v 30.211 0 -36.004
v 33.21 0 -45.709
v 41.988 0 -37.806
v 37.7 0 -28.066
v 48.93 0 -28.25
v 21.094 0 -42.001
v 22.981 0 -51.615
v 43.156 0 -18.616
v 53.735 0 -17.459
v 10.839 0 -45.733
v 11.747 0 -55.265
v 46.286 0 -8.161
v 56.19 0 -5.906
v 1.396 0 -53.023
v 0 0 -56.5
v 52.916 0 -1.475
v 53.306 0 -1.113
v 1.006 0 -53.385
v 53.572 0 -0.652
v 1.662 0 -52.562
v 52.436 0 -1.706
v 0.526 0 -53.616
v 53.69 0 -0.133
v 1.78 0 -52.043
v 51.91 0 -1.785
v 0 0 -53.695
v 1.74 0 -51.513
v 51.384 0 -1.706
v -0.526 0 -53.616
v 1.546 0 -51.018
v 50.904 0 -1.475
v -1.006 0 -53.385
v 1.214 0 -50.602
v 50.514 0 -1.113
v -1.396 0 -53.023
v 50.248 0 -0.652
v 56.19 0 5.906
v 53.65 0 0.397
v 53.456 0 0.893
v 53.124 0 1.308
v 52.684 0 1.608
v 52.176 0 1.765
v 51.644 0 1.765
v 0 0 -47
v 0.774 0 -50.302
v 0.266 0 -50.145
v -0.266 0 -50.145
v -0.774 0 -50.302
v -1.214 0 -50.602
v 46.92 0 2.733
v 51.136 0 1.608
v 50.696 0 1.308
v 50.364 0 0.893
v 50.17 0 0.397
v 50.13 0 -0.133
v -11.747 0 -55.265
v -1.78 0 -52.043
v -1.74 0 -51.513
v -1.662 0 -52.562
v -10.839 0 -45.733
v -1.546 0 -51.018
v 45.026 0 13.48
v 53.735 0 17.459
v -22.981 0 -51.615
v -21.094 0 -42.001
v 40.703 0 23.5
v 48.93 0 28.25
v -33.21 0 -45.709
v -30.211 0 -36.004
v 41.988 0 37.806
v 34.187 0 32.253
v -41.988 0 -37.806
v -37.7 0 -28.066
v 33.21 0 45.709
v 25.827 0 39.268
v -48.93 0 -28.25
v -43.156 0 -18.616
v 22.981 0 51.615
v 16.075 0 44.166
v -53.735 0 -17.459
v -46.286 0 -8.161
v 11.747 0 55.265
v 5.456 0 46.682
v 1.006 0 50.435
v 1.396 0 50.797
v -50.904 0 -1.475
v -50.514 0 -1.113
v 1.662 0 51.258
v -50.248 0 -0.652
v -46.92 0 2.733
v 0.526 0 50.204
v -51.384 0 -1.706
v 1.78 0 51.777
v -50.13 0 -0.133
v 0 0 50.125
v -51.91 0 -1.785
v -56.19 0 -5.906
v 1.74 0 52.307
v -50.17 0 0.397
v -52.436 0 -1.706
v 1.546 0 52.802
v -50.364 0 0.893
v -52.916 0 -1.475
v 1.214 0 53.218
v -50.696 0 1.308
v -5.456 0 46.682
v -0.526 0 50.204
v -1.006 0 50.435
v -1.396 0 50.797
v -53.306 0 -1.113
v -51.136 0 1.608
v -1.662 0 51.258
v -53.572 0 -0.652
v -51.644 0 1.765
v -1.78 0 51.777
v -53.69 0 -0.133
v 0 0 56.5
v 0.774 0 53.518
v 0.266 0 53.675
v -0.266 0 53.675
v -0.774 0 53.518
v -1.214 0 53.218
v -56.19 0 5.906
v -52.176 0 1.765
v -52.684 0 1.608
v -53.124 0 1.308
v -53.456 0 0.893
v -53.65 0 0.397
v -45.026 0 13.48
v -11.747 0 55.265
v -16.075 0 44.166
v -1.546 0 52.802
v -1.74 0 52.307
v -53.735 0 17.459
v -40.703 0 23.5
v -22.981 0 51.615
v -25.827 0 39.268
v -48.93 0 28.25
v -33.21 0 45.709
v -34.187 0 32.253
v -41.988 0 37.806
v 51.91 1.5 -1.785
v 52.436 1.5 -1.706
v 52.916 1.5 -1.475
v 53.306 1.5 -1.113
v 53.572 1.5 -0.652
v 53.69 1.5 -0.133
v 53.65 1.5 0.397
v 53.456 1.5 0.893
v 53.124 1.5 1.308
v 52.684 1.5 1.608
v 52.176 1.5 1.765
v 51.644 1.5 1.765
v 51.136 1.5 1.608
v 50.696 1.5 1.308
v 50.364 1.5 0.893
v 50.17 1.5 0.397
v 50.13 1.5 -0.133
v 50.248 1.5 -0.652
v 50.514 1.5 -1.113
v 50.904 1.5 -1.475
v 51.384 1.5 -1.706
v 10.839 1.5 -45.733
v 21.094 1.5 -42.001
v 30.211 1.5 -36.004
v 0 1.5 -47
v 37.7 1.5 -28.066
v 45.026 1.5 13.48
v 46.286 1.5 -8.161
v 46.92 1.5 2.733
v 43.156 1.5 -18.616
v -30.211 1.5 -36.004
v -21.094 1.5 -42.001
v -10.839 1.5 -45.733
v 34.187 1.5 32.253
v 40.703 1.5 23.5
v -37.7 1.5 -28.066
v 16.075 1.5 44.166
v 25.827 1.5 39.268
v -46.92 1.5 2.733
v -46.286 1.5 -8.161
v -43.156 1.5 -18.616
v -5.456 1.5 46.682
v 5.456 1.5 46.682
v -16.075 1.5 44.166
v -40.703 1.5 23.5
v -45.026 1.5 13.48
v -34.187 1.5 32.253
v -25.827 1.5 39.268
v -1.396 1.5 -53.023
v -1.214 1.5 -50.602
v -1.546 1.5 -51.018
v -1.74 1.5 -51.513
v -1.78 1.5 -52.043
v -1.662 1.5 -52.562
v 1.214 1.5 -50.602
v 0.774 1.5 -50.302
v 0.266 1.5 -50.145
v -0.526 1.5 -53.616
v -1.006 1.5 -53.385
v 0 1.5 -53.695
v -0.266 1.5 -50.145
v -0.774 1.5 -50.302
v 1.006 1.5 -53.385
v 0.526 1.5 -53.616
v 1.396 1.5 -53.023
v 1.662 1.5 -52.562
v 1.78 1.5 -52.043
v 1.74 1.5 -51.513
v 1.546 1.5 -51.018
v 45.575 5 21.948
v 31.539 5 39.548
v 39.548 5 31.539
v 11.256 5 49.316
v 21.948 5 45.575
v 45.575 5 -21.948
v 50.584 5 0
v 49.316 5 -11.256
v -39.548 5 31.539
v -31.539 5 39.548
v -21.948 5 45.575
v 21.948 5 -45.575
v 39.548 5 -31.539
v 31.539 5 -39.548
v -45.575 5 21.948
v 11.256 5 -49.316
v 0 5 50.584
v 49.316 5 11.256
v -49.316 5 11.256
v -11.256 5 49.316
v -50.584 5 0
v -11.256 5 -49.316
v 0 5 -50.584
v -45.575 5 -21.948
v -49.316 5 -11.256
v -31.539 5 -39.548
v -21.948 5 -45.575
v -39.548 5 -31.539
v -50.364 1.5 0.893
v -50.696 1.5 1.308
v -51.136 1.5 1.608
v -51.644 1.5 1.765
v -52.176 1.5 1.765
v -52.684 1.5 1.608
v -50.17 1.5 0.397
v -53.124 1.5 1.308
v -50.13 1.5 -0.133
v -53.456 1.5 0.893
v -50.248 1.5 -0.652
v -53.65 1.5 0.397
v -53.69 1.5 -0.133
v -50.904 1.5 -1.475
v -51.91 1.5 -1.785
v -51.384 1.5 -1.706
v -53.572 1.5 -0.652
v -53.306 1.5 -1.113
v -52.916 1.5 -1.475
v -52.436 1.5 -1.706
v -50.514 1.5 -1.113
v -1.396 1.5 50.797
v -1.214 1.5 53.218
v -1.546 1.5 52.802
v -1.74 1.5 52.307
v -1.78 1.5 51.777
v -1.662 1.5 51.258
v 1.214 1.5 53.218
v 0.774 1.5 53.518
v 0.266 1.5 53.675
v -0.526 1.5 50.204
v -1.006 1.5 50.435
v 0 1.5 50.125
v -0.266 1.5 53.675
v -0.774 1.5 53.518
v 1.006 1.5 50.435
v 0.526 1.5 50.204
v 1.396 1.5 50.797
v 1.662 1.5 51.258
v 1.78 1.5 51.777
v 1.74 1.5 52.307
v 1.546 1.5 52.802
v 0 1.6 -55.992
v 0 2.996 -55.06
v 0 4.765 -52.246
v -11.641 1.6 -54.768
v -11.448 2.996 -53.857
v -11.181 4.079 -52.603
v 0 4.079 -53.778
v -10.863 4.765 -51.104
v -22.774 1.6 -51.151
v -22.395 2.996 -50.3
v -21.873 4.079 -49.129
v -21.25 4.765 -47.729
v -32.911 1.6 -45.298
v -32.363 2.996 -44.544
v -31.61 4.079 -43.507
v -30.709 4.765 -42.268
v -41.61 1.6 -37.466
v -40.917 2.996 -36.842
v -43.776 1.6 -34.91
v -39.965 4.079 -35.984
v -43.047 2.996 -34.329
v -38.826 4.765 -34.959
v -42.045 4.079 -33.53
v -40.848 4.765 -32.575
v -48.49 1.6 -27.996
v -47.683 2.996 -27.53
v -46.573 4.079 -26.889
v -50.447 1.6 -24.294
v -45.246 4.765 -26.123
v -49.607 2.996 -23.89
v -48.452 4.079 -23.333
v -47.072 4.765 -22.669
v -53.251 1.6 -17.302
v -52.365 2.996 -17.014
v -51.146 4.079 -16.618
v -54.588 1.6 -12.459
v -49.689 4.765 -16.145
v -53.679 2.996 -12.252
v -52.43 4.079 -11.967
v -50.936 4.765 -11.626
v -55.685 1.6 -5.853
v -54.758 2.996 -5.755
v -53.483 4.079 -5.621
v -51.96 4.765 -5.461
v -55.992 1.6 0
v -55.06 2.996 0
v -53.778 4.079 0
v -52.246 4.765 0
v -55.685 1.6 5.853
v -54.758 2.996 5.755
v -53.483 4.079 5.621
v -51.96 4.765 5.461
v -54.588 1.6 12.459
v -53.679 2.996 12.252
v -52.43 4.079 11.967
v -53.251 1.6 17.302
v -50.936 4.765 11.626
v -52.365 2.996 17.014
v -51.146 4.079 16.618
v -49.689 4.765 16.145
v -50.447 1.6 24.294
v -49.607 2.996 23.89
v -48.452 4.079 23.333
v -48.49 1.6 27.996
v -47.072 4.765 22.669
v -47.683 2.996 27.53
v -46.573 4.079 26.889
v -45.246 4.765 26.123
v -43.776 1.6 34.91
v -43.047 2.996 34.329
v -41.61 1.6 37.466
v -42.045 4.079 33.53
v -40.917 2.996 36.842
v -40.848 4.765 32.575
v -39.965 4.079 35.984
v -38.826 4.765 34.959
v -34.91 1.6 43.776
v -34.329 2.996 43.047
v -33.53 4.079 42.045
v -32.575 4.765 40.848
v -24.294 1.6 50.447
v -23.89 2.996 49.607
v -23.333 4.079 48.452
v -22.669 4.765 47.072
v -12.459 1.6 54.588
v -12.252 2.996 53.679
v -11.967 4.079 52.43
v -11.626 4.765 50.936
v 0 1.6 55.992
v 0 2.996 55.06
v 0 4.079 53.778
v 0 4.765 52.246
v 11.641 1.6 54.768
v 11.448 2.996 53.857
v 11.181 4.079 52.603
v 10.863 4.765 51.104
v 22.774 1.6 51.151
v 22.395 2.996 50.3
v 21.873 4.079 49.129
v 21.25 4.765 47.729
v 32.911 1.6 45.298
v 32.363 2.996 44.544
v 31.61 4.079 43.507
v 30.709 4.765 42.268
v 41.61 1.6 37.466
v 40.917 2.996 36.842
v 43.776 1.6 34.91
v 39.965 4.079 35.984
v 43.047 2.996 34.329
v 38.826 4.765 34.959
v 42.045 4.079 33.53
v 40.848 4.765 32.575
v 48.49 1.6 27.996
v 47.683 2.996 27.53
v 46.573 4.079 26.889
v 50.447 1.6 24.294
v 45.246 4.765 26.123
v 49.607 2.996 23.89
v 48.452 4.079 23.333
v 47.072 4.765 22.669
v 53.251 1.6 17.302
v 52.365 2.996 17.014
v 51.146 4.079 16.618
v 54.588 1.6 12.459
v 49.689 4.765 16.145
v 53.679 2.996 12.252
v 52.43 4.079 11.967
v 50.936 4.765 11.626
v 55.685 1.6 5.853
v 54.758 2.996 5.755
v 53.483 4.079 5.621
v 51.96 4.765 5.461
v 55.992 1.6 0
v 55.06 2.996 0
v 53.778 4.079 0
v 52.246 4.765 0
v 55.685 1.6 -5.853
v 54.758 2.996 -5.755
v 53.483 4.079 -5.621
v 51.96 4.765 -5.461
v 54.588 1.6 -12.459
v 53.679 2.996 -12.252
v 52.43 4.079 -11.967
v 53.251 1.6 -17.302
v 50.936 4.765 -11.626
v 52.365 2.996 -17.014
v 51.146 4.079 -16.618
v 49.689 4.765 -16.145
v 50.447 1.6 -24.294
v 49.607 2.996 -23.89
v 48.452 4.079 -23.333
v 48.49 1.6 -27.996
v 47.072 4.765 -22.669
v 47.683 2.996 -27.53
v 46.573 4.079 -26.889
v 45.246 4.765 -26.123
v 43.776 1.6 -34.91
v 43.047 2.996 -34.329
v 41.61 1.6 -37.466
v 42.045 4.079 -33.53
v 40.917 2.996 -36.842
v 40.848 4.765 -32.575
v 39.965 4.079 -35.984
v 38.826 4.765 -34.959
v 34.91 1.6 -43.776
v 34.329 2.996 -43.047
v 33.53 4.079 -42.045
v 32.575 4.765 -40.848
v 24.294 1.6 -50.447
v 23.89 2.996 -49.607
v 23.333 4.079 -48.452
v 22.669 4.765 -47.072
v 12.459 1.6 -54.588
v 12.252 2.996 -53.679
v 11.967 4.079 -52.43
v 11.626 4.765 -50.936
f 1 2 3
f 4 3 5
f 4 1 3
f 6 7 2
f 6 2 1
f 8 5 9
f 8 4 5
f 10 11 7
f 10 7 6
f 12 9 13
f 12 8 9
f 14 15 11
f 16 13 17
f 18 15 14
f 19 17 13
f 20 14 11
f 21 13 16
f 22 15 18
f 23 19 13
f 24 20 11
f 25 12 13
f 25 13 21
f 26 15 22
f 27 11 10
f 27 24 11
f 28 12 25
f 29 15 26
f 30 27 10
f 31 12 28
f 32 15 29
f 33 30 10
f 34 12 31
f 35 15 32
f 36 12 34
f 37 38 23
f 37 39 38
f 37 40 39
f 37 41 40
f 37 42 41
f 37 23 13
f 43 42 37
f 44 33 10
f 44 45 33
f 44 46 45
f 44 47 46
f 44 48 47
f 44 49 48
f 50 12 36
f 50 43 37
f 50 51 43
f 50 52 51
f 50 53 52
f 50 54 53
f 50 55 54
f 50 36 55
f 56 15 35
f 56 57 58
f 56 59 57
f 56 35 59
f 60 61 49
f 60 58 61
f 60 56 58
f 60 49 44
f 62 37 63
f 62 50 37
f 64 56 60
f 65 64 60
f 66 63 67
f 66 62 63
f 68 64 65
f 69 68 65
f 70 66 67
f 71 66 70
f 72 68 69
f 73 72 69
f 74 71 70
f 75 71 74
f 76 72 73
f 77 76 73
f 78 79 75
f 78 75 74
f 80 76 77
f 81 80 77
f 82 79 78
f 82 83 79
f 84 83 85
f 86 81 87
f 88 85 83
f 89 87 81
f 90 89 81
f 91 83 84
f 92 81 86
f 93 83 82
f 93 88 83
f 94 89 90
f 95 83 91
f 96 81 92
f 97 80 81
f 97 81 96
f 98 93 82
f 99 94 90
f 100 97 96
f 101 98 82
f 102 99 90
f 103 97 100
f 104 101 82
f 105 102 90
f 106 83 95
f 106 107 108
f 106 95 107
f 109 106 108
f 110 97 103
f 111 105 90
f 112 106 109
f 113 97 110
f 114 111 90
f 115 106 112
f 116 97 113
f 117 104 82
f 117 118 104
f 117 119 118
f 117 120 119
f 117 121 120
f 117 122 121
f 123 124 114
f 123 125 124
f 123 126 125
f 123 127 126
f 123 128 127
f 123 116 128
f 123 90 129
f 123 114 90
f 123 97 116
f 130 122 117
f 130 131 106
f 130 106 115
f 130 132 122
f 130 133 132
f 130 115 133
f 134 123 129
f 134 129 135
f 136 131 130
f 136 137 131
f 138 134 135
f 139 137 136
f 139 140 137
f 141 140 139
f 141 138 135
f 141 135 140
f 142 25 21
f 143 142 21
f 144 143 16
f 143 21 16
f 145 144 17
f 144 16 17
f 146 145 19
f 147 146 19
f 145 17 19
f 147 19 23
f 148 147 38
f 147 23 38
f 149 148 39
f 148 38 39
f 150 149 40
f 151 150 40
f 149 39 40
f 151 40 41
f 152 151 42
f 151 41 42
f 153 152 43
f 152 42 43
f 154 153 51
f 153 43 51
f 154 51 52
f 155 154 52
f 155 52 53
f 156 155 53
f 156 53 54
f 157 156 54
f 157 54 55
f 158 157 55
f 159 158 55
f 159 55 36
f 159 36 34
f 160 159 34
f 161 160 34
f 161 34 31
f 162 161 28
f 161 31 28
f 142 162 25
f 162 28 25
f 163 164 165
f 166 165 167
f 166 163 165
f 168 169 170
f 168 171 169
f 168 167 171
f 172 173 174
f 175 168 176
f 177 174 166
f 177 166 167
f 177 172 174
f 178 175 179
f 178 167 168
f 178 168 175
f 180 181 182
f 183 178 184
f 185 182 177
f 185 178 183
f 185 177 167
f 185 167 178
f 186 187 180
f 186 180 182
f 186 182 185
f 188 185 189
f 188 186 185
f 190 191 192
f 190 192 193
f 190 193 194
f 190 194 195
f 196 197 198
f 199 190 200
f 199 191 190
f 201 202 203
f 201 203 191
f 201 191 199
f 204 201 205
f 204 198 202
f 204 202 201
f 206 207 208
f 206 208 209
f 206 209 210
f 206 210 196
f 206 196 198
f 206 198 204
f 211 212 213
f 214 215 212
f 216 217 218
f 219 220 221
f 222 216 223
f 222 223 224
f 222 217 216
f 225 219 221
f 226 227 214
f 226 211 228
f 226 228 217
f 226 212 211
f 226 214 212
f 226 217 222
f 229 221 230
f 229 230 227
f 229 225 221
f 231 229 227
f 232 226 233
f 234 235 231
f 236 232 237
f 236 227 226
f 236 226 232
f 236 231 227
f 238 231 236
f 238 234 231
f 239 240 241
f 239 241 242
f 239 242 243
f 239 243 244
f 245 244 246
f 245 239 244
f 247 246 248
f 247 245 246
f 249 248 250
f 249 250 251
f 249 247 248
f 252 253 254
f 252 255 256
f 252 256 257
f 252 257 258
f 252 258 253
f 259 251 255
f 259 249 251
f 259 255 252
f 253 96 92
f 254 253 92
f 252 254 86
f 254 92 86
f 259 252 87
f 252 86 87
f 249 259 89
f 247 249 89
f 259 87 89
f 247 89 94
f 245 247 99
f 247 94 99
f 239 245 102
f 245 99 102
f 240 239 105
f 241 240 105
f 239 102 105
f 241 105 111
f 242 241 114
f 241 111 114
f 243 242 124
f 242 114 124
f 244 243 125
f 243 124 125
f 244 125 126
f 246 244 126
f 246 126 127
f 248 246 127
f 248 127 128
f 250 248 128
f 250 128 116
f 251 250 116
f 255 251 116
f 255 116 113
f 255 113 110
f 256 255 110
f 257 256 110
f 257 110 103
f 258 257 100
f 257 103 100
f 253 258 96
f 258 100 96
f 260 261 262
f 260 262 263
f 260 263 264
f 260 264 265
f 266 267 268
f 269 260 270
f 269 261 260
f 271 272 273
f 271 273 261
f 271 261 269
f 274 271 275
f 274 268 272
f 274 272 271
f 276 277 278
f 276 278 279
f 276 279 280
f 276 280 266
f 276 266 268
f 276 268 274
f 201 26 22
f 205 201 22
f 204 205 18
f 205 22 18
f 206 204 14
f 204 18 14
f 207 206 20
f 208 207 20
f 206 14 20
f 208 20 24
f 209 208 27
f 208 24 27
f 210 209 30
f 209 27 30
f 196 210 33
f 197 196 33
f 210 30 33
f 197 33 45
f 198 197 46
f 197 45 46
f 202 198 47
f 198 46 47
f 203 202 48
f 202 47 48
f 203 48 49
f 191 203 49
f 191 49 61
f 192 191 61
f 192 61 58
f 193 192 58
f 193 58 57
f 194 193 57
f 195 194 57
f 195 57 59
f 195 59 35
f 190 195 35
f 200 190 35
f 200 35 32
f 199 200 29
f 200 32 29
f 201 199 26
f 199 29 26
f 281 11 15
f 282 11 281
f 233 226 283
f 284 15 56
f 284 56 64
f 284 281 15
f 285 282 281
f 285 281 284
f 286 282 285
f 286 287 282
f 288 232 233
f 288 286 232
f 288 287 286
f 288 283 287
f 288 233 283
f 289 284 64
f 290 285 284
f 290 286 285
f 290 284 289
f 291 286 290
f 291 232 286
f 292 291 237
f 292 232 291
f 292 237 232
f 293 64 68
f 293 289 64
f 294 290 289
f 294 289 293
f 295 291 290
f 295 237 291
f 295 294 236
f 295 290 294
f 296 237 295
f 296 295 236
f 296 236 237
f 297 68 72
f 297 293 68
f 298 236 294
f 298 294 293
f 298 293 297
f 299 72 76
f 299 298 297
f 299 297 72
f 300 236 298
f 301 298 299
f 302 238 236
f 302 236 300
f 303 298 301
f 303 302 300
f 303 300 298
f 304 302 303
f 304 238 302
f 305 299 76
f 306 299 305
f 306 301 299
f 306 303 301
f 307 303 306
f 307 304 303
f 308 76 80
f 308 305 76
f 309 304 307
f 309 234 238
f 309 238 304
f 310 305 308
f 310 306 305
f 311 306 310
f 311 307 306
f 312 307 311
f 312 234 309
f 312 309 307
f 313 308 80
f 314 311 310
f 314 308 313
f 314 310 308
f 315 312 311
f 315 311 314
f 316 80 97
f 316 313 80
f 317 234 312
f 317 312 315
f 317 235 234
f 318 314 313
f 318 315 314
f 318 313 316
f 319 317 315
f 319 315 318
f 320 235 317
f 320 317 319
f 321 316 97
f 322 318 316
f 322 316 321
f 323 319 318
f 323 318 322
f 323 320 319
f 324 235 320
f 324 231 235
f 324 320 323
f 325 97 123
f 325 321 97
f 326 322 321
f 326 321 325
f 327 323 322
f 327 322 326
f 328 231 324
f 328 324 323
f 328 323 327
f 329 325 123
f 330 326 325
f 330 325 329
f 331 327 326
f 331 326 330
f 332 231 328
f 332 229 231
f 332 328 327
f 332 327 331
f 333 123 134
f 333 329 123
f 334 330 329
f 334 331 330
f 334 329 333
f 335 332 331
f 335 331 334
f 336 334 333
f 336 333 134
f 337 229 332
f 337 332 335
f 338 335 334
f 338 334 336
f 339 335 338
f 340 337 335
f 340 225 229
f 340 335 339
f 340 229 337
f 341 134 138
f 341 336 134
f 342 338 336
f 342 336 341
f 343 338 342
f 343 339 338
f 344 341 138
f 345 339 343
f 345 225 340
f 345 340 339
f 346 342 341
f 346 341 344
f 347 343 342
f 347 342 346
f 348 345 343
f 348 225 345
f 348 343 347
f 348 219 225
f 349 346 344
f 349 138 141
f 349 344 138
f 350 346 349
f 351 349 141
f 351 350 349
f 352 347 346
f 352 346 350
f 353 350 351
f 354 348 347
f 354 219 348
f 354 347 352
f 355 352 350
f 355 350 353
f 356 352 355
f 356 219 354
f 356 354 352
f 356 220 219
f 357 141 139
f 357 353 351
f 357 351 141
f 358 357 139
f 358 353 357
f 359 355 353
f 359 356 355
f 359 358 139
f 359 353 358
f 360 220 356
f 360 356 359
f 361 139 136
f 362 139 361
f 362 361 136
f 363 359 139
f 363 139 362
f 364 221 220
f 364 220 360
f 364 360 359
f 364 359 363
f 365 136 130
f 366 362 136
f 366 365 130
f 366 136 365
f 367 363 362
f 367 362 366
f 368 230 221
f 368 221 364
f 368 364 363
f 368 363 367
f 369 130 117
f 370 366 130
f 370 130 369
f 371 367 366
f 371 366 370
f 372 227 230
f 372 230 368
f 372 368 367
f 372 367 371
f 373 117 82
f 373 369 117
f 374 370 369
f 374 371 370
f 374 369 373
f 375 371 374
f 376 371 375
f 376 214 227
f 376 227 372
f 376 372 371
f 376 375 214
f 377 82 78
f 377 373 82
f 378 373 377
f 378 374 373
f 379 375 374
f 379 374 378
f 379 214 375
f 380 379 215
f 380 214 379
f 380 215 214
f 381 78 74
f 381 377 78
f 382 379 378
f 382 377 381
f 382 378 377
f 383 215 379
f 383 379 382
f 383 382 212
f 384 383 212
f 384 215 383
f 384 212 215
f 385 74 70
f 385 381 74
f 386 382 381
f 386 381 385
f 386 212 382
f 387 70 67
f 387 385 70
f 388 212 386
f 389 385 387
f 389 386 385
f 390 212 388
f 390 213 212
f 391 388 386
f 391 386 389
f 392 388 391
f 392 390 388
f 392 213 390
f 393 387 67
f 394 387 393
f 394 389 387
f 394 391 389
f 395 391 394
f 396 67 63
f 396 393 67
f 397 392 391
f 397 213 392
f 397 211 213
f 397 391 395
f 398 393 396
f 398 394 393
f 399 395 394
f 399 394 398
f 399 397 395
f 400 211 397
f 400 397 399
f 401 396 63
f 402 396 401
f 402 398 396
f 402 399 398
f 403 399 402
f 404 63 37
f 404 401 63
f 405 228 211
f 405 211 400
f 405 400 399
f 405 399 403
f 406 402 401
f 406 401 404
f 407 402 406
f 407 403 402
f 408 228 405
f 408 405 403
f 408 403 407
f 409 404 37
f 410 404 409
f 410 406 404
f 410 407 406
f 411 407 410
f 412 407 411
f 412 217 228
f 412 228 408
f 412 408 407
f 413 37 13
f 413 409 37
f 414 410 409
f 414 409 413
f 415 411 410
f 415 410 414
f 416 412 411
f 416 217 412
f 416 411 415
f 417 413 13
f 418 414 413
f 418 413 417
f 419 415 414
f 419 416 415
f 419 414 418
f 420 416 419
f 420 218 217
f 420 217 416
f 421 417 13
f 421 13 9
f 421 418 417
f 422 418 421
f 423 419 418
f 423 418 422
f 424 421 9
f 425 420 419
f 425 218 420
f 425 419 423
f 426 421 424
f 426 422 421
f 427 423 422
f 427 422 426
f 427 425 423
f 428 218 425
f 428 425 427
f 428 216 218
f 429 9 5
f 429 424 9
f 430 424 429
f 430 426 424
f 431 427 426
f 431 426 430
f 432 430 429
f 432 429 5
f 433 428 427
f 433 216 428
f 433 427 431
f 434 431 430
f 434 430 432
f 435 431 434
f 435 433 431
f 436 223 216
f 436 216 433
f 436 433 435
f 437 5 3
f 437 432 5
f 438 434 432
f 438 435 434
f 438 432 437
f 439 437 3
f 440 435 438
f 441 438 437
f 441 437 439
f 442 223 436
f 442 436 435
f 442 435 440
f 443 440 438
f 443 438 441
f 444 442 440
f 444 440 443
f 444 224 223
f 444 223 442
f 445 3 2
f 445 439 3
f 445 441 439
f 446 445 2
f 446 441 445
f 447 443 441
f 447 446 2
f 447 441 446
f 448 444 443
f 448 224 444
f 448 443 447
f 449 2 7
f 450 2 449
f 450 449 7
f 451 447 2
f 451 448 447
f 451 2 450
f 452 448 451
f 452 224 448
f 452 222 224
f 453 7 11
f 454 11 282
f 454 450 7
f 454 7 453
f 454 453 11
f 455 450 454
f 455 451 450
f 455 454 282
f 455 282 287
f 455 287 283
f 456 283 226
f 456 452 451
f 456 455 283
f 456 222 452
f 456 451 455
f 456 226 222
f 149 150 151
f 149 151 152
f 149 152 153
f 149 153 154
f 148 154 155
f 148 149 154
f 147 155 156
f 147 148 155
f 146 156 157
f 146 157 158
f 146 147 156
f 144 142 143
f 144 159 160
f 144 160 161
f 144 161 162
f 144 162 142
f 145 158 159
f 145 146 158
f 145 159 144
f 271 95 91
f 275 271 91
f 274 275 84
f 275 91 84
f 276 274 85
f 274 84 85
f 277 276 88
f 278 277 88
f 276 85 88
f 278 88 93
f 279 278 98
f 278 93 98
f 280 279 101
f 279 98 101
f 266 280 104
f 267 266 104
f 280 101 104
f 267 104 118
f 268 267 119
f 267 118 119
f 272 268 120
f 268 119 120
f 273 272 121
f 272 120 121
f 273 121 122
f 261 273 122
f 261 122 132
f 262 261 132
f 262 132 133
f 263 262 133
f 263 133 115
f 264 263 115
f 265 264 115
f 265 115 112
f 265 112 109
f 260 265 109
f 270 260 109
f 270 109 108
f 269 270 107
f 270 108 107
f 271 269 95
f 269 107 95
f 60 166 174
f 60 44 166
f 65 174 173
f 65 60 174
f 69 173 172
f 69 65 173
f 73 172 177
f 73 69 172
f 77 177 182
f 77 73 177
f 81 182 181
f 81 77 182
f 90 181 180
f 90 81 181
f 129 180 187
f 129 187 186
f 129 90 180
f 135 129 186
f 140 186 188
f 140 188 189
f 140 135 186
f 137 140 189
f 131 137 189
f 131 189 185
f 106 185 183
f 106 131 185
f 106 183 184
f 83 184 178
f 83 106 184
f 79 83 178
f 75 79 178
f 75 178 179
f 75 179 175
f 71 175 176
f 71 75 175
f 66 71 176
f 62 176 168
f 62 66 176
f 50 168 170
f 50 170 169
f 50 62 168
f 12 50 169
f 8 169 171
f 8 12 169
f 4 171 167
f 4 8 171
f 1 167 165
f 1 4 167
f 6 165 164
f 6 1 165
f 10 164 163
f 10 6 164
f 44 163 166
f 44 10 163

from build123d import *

# Parameters (mm, degrees)
SKETCH2_R          = 1.785
CUT_EXTRUDE1_DEPTH = 1.5


with BuildPart() as part:
    # Sketch1 → Revolve1 (revolve)
    with BuildSketch(Plane.XY, mode=Mode.PRIVATE) as revolve1_sk:
        with BuildLine():
            Line((50.583920217, 5), (0, 5))
            Line((0, 5), (0, 1.5))
            Line((0, 1.5), (47, 1.5))
            Line((47, 1.5), (47, 0))
            Line((47, 0), (56.5, 0))
            ThreePointArc((56.5, 0), (54.456903563, 3.582575695), (50.583920217, 5))
        make_face()
    revolve(revolve1_sk.sketch.rotate(Axis((0, 0, 0), (0, 1, 0)), 90), axis=Axis((0, 0, 0), (0, 1, 0)))

    # Sketch2 → Cut-Extrude1 (cut)
    with BuildSketch(Plane.XZ):
        with Locations(Location((0, 51.91, 0), (0, 0, 270))):
            Circle(SKETCH2_R)
        with Locations(Location((51.91, 0, 0), (0, 0, 270))):
            Circle(SKETCH2_R)
        with Locations(Location((0, -51.91, 0), (0, 0, 270))):
            Circle(SKETCH2_R)
        with Locations(Location((-51.91, 0, 0), (0, 0, 270))):
            Circle(SKETCH2_R)
    extrude(amount=-CUT_EXTRUDE1_DEPTH, mode=Mode.SUBTRACT)


solid = part.part
